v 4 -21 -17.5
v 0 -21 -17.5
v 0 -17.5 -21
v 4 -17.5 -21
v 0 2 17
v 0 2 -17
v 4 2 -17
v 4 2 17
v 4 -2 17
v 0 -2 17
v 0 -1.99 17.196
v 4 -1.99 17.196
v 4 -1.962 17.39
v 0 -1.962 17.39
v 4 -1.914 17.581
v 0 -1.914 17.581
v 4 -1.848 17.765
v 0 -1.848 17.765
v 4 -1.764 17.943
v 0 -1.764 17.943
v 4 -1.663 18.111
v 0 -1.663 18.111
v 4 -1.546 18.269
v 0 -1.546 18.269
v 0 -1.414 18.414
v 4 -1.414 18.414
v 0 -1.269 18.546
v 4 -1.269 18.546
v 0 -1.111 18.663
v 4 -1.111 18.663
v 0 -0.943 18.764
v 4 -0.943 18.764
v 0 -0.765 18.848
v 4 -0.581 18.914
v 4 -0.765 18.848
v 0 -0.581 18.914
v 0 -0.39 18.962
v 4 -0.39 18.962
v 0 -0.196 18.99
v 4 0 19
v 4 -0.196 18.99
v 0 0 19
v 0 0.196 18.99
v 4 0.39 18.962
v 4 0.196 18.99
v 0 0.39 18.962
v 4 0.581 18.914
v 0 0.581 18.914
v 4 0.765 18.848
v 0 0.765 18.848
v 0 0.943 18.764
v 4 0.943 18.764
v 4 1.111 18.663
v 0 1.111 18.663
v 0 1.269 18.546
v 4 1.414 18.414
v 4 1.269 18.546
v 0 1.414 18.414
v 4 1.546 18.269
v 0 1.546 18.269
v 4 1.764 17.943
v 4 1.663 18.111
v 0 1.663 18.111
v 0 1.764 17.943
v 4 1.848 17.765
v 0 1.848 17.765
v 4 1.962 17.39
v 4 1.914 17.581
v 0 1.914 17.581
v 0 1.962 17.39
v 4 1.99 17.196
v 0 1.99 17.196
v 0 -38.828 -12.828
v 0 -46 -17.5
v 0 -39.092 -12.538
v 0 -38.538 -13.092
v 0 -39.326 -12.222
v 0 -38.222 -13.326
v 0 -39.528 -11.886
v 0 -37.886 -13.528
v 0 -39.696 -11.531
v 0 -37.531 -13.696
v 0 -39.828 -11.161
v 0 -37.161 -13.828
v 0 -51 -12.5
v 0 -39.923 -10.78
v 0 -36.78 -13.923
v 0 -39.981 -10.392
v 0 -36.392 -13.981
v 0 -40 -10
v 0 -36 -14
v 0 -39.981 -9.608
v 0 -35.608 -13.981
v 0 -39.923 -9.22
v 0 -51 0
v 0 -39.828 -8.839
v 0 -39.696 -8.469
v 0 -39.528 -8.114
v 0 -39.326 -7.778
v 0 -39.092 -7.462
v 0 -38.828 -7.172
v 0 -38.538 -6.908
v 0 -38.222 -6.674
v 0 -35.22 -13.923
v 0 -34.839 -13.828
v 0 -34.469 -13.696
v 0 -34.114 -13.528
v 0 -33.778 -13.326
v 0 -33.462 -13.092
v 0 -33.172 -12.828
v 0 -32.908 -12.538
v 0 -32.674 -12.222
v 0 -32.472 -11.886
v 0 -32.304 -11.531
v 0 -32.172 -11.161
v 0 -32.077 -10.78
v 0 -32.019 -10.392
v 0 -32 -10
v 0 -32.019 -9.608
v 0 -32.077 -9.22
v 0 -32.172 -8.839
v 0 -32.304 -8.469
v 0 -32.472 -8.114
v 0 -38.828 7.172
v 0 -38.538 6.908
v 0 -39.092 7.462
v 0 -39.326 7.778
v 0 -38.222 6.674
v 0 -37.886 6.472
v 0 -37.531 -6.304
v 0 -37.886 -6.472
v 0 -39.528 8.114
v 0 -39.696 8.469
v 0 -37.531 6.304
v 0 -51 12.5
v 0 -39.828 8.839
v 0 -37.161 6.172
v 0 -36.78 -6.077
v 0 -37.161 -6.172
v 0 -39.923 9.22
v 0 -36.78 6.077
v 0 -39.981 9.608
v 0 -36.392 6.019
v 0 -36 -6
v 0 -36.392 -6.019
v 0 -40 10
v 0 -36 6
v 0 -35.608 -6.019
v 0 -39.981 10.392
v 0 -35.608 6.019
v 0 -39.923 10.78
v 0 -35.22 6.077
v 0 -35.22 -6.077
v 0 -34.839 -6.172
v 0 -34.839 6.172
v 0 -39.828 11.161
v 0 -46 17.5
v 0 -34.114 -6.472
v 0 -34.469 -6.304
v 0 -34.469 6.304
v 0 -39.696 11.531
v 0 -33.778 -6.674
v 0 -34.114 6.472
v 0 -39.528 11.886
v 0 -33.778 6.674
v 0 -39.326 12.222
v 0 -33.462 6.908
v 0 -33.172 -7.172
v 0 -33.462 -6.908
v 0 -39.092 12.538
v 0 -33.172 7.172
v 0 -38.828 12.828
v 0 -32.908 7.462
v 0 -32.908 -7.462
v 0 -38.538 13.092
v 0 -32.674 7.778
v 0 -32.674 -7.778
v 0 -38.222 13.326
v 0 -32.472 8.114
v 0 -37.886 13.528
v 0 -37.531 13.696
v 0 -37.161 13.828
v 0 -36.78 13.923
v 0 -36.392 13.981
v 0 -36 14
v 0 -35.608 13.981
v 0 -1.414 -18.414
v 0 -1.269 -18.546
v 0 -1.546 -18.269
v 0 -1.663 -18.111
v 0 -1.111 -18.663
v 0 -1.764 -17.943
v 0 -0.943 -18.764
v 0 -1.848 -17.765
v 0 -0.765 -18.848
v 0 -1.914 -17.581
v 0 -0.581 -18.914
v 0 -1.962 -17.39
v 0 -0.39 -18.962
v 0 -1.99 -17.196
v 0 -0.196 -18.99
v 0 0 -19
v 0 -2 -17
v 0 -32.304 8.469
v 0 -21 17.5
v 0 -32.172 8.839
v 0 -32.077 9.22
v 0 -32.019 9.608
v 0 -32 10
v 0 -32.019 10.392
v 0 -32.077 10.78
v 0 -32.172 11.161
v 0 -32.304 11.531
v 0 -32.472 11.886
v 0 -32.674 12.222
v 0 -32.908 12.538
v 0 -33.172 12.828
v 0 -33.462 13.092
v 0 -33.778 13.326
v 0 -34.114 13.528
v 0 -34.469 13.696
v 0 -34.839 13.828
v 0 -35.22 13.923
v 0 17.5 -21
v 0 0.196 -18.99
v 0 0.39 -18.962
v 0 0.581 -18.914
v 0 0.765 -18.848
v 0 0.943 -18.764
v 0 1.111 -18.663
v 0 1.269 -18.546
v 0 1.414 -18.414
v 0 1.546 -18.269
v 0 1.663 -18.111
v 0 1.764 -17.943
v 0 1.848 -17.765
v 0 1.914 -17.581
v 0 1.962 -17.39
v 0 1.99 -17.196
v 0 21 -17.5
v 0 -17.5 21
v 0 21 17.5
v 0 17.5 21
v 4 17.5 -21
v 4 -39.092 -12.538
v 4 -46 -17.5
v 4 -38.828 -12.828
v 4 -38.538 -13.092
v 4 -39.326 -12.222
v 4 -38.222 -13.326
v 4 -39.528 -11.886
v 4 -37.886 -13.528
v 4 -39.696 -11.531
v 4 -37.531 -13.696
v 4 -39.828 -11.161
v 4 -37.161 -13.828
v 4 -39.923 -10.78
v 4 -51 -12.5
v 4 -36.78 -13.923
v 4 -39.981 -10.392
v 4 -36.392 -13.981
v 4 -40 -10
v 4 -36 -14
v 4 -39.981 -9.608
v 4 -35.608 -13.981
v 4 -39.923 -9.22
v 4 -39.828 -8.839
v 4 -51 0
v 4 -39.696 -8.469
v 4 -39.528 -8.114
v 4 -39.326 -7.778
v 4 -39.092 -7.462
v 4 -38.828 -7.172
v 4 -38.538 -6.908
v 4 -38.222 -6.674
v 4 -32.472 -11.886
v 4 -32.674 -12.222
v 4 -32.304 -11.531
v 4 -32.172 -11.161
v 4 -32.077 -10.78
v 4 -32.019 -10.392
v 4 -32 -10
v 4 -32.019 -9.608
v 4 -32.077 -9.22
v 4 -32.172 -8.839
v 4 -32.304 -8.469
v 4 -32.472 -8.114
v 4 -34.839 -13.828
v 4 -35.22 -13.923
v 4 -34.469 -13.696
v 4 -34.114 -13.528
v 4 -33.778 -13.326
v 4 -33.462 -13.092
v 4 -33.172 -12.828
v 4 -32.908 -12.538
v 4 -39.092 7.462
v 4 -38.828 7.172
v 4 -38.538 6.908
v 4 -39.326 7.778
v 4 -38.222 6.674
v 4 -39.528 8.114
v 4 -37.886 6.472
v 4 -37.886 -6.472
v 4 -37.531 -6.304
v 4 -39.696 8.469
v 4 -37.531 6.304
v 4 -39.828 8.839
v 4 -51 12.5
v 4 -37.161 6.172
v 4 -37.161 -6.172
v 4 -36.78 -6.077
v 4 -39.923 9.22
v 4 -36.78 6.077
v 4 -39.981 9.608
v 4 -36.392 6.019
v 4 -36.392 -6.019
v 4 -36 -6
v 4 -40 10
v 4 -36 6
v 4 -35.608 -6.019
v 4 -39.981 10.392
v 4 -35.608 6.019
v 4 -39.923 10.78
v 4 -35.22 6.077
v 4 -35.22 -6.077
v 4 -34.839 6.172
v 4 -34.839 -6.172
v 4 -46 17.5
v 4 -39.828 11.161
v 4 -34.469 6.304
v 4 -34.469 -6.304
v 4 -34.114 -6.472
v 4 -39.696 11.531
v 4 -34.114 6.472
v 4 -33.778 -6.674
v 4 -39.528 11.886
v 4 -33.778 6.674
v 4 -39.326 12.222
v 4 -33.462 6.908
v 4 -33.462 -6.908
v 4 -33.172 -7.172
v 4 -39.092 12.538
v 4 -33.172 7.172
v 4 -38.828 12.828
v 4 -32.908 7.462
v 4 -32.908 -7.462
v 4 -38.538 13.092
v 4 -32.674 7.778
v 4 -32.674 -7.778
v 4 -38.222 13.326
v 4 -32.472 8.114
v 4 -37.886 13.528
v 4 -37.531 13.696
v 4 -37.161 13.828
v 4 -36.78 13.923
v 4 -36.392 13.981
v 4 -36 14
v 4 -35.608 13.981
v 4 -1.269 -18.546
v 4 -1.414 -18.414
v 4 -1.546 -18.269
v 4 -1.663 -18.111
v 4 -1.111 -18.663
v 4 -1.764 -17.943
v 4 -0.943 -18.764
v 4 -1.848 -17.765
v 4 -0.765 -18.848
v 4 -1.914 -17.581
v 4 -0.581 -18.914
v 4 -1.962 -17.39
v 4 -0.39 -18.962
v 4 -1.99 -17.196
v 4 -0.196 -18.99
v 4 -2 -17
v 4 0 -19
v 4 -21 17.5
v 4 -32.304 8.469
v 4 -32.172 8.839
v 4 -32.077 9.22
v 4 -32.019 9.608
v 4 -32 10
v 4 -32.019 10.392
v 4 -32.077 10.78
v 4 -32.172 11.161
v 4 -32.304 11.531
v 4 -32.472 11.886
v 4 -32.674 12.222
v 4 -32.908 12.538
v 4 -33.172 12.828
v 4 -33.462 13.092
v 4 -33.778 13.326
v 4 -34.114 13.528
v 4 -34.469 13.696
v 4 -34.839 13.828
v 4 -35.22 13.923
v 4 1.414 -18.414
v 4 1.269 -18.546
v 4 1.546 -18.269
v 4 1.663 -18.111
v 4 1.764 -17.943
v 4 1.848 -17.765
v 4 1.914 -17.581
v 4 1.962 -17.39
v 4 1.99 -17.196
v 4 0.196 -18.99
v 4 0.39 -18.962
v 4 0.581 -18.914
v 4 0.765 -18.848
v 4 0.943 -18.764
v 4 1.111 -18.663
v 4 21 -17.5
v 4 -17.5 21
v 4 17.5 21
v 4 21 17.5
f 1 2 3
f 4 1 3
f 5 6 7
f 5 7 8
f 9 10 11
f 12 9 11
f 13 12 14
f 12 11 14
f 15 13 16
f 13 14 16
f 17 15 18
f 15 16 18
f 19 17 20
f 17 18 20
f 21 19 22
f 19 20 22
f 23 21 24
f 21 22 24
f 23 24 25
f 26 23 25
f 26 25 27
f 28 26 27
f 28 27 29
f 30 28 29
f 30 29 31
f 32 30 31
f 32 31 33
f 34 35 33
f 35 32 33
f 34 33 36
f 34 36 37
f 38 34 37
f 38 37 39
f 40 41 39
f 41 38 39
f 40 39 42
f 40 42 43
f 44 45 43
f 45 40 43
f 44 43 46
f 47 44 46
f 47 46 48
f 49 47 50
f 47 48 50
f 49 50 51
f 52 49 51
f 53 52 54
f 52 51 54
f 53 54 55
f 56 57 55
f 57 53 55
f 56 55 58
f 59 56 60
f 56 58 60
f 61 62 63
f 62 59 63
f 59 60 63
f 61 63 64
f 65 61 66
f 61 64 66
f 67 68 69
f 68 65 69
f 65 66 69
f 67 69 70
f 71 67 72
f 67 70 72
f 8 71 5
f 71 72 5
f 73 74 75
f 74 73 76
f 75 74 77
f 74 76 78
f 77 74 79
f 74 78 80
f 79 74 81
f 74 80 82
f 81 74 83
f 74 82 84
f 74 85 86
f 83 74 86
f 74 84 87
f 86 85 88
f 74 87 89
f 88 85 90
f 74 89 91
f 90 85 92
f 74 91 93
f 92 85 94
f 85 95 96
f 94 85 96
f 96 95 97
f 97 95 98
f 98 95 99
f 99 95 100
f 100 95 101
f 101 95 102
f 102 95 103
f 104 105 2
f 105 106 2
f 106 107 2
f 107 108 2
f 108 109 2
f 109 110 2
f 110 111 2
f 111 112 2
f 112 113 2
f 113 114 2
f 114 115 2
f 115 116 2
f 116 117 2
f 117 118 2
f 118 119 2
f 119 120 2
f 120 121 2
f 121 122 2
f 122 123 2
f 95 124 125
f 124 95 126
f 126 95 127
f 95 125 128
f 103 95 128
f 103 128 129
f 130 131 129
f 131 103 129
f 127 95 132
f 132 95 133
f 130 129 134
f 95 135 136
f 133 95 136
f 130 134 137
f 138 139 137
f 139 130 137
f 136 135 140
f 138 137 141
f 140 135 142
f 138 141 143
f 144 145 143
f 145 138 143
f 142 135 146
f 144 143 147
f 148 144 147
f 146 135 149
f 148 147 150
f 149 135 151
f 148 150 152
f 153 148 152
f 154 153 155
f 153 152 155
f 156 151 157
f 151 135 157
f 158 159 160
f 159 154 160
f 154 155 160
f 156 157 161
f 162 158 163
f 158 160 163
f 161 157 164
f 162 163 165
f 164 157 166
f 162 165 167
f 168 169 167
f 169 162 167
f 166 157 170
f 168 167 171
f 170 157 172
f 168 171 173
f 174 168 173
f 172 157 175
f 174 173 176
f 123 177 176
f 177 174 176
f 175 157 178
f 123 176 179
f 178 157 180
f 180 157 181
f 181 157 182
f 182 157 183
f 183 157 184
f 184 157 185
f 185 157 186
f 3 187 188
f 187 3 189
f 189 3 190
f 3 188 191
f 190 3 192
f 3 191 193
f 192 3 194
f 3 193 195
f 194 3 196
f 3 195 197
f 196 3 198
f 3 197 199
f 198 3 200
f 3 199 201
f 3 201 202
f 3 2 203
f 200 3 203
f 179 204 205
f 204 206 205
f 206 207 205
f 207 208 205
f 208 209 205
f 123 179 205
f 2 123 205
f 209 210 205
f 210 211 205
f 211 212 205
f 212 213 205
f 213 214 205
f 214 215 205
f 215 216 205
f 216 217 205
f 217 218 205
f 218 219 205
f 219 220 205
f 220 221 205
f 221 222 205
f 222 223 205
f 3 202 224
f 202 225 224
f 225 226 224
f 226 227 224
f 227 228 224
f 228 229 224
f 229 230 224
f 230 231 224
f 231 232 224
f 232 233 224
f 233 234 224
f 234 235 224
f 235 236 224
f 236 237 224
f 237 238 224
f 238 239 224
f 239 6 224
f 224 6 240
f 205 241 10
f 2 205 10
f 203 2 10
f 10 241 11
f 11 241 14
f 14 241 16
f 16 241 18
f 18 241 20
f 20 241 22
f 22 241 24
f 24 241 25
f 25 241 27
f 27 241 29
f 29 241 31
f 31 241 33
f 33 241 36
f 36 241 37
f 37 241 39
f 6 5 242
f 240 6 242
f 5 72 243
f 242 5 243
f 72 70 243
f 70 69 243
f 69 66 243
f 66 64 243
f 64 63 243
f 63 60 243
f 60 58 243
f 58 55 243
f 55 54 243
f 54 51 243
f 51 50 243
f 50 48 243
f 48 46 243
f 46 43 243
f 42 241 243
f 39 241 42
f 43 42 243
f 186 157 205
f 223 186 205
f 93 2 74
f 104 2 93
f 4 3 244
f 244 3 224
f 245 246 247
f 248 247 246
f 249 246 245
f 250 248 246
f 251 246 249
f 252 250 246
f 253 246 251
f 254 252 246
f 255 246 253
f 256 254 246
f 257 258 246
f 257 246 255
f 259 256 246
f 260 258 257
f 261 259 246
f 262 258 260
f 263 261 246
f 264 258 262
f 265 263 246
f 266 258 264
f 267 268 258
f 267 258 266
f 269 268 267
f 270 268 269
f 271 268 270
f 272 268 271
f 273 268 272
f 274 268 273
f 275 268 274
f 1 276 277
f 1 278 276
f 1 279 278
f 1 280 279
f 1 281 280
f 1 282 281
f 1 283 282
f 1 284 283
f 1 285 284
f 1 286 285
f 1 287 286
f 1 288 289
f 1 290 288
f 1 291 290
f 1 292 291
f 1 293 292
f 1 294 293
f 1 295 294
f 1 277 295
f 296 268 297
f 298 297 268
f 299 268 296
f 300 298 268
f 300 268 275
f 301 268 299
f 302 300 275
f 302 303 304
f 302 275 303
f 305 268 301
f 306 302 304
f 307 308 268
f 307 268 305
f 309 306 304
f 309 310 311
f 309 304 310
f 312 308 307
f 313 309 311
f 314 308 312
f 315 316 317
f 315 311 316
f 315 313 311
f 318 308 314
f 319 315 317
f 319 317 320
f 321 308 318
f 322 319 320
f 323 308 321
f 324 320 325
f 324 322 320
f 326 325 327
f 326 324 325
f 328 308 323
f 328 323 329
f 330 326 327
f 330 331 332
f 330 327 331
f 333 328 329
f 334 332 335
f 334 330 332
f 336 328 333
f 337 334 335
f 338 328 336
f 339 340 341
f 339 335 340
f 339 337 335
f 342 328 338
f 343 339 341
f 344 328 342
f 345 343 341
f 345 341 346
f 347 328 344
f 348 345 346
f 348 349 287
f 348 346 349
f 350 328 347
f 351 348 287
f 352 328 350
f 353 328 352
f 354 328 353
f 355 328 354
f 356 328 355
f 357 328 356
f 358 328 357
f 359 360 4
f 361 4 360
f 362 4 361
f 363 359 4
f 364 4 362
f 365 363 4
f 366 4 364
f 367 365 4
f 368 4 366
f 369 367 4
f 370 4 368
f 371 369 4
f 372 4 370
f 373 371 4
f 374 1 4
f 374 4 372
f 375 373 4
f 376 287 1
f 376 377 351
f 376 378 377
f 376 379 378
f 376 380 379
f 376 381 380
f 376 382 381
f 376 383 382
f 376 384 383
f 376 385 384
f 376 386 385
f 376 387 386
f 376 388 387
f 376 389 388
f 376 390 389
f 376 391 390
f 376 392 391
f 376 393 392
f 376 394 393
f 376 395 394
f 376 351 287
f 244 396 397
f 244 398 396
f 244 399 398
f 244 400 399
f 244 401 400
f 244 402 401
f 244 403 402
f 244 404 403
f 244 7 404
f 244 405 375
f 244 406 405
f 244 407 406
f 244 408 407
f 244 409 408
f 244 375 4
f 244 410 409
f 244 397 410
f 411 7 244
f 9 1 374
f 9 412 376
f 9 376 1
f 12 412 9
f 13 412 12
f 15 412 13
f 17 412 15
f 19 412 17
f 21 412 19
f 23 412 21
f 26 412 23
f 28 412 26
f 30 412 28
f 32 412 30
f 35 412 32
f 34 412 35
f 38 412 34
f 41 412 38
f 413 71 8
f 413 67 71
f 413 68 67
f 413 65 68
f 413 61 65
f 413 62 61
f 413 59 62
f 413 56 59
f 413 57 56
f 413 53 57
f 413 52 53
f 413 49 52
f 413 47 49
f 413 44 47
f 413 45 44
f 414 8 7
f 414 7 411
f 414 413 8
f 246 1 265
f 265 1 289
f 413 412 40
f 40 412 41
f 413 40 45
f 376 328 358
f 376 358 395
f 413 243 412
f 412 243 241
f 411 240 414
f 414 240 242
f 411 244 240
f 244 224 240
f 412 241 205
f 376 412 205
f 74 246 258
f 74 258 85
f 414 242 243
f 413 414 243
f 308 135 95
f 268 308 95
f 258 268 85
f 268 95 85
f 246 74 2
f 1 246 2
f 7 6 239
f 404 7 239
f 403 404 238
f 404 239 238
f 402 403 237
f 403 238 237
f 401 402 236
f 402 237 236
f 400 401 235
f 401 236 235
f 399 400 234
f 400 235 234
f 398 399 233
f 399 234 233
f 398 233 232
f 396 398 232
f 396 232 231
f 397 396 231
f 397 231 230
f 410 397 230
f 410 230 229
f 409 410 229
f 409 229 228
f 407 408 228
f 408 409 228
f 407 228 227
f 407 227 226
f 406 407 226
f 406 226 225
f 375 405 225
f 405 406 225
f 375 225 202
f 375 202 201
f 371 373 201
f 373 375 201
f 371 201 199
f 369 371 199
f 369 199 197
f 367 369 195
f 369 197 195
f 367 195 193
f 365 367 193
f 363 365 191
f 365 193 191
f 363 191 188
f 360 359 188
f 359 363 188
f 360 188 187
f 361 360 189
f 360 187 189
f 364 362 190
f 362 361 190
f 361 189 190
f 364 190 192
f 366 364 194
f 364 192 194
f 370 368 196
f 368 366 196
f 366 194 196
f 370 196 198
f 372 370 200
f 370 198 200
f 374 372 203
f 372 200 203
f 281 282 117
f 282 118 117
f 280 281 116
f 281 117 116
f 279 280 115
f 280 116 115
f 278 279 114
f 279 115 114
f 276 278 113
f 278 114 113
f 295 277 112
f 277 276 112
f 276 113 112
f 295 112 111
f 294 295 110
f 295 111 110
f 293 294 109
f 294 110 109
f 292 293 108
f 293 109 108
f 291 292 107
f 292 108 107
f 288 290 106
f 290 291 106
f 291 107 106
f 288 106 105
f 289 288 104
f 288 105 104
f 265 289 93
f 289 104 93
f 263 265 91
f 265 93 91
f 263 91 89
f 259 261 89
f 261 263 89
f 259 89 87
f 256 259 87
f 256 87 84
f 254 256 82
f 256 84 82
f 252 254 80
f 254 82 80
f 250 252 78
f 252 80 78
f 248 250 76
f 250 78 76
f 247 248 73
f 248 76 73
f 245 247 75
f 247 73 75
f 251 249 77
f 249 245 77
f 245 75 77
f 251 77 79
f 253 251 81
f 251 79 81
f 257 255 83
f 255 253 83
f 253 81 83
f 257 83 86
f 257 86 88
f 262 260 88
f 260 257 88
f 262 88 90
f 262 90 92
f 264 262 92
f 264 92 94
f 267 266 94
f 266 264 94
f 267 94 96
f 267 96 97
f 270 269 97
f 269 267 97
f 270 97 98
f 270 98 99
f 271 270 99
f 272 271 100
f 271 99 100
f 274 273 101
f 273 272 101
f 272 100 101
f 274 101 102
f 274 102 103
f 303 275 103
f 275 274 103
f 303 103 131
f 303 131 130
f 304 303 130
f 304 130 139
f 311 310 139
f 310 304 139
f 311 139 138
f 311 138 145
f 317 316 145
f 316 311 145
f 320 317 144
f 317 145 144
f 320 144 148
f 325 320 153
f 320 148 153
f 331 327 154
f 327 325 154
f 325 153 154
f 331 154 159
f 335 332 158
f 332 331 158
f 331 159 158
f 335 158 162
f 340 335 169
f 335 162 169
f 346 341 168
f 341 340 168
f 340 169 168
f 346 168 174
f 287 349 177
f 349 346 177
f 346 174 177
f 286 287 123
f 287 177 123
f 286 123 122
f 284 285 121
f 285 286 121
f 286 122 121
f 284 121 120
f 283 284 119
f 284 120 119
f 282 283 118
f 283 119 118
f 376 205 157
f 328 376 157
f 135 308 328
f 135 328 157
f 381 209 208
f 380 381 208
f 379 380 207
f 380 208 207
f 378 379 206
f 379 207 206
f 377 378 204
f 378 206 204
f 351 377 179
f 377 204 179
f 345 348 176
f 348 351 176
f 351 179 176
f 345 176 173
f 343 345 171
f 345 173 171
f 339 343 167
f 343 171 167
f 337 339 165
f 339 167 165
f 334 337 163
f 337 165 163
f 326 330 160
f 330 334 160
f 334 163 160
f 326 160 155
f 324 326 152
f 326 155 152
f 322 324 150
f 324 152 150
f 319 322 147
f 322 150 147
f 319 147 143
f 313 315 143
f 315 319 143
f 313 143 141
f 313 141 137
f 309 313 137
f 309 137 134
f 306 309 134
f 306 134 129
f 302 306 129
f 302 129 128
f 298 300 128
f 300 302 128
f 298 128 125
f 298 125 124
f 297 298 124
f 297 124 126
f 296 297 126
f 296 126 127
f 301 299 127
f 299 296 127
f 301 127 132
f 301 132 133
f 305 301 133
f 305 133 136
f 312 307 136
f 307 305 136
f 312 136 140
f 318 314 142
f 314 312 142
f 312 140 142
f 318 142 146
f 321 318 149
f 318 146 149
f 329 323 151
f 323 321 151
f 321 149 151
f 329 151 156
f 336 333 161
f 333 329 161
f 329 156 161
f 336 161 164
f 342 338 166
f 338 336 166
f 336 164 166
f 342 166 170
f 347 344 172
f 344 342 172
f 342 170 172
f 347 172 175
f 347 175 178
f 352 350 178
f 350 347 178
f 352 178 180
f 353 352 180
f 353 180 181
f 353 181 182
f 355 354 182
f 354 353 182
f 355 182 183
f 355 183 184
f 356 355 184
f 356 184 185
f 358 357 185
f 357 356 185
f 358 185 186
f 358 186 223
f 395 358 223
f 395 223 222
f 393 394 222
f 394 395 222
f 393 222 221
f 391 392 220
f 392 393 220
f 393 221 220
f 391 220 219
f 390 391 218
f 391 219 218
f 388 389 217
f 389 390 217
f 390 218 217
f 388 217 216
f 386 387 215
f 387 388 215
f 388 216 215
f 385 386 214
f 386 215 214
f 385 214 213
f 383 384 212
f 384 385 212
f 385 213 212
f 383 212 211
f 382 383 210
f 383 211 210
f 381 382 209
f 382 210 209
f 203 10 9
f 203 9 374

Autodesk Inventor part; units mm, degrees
ref_plane "YZ Plane" through (0, 0, 0) normal (1, 0, 0) x (0, 1, 0)
ref_plane "XZ Plane" through (0, 0, 0) normal (0, 1, 0) x (-1, 0, 0)
ref_plane "XY Plane" through (0, 0, 0) normal (0, 0, 1) x (1, 0, 0)
sketch "Эскиз1" plane through (0, 0, 0) normal (1, 0, 0) x (0, 1, 0)
  line L0 (-17.5, 21) -> (-21, 17.5)
  line L1 (-21, 17.5) -> (-21, -17.5)
  line L2 (-21, -17.5) -> (-17.5, -21)
  line L3 (-17.5, -21) -> (17.5, -21)
  line L4 (17.5, -21) -> (21, -17.5)
  line L5 (21, -17.5) -> (21, 17.5)
  line L6 (21, 17.5) -> (17.5, 21)
  line L7 (17.5, 21) -> (-17.5, 21)
  line L8 (-21, 17.5) -> (-51, 17.5)
  line L9 (-51, 17.5) -> (-51, -17.5)
  line L10 (-51, -17.5) -> (-21, -17.5)
  line L11 (-21, -17.5) -> (-21, 17.5)
  line L12 (-51, 0) -> (-36, 0)
  line L13 (-36, 0) -> (-36, 10)
  line L14 (-36, 10) -> (-36, -10)
  circle A0 centre (-36, 10) radius 4
  circle A1 centre (-36, -10) radius 4
  line L15 (0, 17) -> (0, -17) construction
  line L16 (-2, 17) -> (-2, -17)
  line L17 (2, -17) -> (2, 17)
  arc A2 (2, 17) -> (-2, 17) centre (0, 17) ccw
  arc A3 (-2, -17) -> (2, -17) centre (0, -17) ccw
  point P0 (0, 0)
  point P1 (0, 0)
  point P2 (0, 0)
  dimension "d0" = 30
  dimension "d1" = 15
  dimension "d2" = 10
  dimension "d3" = 20
  dimension "d4" = 8
  dimension "d5" = 8
  dimension "d12" = 17
  dimension "d13" = 4
extrude "Выдавливание1" add sketch "Эскиз1" along normal blind 4
chamfer "Фаска1" distance 5 angle 45 2 edges at (2, -51, 17.5) (2, -51, -17.5)
properties part number "КВ33.044.002 - Держатель катка" material "Пластик АБС"
